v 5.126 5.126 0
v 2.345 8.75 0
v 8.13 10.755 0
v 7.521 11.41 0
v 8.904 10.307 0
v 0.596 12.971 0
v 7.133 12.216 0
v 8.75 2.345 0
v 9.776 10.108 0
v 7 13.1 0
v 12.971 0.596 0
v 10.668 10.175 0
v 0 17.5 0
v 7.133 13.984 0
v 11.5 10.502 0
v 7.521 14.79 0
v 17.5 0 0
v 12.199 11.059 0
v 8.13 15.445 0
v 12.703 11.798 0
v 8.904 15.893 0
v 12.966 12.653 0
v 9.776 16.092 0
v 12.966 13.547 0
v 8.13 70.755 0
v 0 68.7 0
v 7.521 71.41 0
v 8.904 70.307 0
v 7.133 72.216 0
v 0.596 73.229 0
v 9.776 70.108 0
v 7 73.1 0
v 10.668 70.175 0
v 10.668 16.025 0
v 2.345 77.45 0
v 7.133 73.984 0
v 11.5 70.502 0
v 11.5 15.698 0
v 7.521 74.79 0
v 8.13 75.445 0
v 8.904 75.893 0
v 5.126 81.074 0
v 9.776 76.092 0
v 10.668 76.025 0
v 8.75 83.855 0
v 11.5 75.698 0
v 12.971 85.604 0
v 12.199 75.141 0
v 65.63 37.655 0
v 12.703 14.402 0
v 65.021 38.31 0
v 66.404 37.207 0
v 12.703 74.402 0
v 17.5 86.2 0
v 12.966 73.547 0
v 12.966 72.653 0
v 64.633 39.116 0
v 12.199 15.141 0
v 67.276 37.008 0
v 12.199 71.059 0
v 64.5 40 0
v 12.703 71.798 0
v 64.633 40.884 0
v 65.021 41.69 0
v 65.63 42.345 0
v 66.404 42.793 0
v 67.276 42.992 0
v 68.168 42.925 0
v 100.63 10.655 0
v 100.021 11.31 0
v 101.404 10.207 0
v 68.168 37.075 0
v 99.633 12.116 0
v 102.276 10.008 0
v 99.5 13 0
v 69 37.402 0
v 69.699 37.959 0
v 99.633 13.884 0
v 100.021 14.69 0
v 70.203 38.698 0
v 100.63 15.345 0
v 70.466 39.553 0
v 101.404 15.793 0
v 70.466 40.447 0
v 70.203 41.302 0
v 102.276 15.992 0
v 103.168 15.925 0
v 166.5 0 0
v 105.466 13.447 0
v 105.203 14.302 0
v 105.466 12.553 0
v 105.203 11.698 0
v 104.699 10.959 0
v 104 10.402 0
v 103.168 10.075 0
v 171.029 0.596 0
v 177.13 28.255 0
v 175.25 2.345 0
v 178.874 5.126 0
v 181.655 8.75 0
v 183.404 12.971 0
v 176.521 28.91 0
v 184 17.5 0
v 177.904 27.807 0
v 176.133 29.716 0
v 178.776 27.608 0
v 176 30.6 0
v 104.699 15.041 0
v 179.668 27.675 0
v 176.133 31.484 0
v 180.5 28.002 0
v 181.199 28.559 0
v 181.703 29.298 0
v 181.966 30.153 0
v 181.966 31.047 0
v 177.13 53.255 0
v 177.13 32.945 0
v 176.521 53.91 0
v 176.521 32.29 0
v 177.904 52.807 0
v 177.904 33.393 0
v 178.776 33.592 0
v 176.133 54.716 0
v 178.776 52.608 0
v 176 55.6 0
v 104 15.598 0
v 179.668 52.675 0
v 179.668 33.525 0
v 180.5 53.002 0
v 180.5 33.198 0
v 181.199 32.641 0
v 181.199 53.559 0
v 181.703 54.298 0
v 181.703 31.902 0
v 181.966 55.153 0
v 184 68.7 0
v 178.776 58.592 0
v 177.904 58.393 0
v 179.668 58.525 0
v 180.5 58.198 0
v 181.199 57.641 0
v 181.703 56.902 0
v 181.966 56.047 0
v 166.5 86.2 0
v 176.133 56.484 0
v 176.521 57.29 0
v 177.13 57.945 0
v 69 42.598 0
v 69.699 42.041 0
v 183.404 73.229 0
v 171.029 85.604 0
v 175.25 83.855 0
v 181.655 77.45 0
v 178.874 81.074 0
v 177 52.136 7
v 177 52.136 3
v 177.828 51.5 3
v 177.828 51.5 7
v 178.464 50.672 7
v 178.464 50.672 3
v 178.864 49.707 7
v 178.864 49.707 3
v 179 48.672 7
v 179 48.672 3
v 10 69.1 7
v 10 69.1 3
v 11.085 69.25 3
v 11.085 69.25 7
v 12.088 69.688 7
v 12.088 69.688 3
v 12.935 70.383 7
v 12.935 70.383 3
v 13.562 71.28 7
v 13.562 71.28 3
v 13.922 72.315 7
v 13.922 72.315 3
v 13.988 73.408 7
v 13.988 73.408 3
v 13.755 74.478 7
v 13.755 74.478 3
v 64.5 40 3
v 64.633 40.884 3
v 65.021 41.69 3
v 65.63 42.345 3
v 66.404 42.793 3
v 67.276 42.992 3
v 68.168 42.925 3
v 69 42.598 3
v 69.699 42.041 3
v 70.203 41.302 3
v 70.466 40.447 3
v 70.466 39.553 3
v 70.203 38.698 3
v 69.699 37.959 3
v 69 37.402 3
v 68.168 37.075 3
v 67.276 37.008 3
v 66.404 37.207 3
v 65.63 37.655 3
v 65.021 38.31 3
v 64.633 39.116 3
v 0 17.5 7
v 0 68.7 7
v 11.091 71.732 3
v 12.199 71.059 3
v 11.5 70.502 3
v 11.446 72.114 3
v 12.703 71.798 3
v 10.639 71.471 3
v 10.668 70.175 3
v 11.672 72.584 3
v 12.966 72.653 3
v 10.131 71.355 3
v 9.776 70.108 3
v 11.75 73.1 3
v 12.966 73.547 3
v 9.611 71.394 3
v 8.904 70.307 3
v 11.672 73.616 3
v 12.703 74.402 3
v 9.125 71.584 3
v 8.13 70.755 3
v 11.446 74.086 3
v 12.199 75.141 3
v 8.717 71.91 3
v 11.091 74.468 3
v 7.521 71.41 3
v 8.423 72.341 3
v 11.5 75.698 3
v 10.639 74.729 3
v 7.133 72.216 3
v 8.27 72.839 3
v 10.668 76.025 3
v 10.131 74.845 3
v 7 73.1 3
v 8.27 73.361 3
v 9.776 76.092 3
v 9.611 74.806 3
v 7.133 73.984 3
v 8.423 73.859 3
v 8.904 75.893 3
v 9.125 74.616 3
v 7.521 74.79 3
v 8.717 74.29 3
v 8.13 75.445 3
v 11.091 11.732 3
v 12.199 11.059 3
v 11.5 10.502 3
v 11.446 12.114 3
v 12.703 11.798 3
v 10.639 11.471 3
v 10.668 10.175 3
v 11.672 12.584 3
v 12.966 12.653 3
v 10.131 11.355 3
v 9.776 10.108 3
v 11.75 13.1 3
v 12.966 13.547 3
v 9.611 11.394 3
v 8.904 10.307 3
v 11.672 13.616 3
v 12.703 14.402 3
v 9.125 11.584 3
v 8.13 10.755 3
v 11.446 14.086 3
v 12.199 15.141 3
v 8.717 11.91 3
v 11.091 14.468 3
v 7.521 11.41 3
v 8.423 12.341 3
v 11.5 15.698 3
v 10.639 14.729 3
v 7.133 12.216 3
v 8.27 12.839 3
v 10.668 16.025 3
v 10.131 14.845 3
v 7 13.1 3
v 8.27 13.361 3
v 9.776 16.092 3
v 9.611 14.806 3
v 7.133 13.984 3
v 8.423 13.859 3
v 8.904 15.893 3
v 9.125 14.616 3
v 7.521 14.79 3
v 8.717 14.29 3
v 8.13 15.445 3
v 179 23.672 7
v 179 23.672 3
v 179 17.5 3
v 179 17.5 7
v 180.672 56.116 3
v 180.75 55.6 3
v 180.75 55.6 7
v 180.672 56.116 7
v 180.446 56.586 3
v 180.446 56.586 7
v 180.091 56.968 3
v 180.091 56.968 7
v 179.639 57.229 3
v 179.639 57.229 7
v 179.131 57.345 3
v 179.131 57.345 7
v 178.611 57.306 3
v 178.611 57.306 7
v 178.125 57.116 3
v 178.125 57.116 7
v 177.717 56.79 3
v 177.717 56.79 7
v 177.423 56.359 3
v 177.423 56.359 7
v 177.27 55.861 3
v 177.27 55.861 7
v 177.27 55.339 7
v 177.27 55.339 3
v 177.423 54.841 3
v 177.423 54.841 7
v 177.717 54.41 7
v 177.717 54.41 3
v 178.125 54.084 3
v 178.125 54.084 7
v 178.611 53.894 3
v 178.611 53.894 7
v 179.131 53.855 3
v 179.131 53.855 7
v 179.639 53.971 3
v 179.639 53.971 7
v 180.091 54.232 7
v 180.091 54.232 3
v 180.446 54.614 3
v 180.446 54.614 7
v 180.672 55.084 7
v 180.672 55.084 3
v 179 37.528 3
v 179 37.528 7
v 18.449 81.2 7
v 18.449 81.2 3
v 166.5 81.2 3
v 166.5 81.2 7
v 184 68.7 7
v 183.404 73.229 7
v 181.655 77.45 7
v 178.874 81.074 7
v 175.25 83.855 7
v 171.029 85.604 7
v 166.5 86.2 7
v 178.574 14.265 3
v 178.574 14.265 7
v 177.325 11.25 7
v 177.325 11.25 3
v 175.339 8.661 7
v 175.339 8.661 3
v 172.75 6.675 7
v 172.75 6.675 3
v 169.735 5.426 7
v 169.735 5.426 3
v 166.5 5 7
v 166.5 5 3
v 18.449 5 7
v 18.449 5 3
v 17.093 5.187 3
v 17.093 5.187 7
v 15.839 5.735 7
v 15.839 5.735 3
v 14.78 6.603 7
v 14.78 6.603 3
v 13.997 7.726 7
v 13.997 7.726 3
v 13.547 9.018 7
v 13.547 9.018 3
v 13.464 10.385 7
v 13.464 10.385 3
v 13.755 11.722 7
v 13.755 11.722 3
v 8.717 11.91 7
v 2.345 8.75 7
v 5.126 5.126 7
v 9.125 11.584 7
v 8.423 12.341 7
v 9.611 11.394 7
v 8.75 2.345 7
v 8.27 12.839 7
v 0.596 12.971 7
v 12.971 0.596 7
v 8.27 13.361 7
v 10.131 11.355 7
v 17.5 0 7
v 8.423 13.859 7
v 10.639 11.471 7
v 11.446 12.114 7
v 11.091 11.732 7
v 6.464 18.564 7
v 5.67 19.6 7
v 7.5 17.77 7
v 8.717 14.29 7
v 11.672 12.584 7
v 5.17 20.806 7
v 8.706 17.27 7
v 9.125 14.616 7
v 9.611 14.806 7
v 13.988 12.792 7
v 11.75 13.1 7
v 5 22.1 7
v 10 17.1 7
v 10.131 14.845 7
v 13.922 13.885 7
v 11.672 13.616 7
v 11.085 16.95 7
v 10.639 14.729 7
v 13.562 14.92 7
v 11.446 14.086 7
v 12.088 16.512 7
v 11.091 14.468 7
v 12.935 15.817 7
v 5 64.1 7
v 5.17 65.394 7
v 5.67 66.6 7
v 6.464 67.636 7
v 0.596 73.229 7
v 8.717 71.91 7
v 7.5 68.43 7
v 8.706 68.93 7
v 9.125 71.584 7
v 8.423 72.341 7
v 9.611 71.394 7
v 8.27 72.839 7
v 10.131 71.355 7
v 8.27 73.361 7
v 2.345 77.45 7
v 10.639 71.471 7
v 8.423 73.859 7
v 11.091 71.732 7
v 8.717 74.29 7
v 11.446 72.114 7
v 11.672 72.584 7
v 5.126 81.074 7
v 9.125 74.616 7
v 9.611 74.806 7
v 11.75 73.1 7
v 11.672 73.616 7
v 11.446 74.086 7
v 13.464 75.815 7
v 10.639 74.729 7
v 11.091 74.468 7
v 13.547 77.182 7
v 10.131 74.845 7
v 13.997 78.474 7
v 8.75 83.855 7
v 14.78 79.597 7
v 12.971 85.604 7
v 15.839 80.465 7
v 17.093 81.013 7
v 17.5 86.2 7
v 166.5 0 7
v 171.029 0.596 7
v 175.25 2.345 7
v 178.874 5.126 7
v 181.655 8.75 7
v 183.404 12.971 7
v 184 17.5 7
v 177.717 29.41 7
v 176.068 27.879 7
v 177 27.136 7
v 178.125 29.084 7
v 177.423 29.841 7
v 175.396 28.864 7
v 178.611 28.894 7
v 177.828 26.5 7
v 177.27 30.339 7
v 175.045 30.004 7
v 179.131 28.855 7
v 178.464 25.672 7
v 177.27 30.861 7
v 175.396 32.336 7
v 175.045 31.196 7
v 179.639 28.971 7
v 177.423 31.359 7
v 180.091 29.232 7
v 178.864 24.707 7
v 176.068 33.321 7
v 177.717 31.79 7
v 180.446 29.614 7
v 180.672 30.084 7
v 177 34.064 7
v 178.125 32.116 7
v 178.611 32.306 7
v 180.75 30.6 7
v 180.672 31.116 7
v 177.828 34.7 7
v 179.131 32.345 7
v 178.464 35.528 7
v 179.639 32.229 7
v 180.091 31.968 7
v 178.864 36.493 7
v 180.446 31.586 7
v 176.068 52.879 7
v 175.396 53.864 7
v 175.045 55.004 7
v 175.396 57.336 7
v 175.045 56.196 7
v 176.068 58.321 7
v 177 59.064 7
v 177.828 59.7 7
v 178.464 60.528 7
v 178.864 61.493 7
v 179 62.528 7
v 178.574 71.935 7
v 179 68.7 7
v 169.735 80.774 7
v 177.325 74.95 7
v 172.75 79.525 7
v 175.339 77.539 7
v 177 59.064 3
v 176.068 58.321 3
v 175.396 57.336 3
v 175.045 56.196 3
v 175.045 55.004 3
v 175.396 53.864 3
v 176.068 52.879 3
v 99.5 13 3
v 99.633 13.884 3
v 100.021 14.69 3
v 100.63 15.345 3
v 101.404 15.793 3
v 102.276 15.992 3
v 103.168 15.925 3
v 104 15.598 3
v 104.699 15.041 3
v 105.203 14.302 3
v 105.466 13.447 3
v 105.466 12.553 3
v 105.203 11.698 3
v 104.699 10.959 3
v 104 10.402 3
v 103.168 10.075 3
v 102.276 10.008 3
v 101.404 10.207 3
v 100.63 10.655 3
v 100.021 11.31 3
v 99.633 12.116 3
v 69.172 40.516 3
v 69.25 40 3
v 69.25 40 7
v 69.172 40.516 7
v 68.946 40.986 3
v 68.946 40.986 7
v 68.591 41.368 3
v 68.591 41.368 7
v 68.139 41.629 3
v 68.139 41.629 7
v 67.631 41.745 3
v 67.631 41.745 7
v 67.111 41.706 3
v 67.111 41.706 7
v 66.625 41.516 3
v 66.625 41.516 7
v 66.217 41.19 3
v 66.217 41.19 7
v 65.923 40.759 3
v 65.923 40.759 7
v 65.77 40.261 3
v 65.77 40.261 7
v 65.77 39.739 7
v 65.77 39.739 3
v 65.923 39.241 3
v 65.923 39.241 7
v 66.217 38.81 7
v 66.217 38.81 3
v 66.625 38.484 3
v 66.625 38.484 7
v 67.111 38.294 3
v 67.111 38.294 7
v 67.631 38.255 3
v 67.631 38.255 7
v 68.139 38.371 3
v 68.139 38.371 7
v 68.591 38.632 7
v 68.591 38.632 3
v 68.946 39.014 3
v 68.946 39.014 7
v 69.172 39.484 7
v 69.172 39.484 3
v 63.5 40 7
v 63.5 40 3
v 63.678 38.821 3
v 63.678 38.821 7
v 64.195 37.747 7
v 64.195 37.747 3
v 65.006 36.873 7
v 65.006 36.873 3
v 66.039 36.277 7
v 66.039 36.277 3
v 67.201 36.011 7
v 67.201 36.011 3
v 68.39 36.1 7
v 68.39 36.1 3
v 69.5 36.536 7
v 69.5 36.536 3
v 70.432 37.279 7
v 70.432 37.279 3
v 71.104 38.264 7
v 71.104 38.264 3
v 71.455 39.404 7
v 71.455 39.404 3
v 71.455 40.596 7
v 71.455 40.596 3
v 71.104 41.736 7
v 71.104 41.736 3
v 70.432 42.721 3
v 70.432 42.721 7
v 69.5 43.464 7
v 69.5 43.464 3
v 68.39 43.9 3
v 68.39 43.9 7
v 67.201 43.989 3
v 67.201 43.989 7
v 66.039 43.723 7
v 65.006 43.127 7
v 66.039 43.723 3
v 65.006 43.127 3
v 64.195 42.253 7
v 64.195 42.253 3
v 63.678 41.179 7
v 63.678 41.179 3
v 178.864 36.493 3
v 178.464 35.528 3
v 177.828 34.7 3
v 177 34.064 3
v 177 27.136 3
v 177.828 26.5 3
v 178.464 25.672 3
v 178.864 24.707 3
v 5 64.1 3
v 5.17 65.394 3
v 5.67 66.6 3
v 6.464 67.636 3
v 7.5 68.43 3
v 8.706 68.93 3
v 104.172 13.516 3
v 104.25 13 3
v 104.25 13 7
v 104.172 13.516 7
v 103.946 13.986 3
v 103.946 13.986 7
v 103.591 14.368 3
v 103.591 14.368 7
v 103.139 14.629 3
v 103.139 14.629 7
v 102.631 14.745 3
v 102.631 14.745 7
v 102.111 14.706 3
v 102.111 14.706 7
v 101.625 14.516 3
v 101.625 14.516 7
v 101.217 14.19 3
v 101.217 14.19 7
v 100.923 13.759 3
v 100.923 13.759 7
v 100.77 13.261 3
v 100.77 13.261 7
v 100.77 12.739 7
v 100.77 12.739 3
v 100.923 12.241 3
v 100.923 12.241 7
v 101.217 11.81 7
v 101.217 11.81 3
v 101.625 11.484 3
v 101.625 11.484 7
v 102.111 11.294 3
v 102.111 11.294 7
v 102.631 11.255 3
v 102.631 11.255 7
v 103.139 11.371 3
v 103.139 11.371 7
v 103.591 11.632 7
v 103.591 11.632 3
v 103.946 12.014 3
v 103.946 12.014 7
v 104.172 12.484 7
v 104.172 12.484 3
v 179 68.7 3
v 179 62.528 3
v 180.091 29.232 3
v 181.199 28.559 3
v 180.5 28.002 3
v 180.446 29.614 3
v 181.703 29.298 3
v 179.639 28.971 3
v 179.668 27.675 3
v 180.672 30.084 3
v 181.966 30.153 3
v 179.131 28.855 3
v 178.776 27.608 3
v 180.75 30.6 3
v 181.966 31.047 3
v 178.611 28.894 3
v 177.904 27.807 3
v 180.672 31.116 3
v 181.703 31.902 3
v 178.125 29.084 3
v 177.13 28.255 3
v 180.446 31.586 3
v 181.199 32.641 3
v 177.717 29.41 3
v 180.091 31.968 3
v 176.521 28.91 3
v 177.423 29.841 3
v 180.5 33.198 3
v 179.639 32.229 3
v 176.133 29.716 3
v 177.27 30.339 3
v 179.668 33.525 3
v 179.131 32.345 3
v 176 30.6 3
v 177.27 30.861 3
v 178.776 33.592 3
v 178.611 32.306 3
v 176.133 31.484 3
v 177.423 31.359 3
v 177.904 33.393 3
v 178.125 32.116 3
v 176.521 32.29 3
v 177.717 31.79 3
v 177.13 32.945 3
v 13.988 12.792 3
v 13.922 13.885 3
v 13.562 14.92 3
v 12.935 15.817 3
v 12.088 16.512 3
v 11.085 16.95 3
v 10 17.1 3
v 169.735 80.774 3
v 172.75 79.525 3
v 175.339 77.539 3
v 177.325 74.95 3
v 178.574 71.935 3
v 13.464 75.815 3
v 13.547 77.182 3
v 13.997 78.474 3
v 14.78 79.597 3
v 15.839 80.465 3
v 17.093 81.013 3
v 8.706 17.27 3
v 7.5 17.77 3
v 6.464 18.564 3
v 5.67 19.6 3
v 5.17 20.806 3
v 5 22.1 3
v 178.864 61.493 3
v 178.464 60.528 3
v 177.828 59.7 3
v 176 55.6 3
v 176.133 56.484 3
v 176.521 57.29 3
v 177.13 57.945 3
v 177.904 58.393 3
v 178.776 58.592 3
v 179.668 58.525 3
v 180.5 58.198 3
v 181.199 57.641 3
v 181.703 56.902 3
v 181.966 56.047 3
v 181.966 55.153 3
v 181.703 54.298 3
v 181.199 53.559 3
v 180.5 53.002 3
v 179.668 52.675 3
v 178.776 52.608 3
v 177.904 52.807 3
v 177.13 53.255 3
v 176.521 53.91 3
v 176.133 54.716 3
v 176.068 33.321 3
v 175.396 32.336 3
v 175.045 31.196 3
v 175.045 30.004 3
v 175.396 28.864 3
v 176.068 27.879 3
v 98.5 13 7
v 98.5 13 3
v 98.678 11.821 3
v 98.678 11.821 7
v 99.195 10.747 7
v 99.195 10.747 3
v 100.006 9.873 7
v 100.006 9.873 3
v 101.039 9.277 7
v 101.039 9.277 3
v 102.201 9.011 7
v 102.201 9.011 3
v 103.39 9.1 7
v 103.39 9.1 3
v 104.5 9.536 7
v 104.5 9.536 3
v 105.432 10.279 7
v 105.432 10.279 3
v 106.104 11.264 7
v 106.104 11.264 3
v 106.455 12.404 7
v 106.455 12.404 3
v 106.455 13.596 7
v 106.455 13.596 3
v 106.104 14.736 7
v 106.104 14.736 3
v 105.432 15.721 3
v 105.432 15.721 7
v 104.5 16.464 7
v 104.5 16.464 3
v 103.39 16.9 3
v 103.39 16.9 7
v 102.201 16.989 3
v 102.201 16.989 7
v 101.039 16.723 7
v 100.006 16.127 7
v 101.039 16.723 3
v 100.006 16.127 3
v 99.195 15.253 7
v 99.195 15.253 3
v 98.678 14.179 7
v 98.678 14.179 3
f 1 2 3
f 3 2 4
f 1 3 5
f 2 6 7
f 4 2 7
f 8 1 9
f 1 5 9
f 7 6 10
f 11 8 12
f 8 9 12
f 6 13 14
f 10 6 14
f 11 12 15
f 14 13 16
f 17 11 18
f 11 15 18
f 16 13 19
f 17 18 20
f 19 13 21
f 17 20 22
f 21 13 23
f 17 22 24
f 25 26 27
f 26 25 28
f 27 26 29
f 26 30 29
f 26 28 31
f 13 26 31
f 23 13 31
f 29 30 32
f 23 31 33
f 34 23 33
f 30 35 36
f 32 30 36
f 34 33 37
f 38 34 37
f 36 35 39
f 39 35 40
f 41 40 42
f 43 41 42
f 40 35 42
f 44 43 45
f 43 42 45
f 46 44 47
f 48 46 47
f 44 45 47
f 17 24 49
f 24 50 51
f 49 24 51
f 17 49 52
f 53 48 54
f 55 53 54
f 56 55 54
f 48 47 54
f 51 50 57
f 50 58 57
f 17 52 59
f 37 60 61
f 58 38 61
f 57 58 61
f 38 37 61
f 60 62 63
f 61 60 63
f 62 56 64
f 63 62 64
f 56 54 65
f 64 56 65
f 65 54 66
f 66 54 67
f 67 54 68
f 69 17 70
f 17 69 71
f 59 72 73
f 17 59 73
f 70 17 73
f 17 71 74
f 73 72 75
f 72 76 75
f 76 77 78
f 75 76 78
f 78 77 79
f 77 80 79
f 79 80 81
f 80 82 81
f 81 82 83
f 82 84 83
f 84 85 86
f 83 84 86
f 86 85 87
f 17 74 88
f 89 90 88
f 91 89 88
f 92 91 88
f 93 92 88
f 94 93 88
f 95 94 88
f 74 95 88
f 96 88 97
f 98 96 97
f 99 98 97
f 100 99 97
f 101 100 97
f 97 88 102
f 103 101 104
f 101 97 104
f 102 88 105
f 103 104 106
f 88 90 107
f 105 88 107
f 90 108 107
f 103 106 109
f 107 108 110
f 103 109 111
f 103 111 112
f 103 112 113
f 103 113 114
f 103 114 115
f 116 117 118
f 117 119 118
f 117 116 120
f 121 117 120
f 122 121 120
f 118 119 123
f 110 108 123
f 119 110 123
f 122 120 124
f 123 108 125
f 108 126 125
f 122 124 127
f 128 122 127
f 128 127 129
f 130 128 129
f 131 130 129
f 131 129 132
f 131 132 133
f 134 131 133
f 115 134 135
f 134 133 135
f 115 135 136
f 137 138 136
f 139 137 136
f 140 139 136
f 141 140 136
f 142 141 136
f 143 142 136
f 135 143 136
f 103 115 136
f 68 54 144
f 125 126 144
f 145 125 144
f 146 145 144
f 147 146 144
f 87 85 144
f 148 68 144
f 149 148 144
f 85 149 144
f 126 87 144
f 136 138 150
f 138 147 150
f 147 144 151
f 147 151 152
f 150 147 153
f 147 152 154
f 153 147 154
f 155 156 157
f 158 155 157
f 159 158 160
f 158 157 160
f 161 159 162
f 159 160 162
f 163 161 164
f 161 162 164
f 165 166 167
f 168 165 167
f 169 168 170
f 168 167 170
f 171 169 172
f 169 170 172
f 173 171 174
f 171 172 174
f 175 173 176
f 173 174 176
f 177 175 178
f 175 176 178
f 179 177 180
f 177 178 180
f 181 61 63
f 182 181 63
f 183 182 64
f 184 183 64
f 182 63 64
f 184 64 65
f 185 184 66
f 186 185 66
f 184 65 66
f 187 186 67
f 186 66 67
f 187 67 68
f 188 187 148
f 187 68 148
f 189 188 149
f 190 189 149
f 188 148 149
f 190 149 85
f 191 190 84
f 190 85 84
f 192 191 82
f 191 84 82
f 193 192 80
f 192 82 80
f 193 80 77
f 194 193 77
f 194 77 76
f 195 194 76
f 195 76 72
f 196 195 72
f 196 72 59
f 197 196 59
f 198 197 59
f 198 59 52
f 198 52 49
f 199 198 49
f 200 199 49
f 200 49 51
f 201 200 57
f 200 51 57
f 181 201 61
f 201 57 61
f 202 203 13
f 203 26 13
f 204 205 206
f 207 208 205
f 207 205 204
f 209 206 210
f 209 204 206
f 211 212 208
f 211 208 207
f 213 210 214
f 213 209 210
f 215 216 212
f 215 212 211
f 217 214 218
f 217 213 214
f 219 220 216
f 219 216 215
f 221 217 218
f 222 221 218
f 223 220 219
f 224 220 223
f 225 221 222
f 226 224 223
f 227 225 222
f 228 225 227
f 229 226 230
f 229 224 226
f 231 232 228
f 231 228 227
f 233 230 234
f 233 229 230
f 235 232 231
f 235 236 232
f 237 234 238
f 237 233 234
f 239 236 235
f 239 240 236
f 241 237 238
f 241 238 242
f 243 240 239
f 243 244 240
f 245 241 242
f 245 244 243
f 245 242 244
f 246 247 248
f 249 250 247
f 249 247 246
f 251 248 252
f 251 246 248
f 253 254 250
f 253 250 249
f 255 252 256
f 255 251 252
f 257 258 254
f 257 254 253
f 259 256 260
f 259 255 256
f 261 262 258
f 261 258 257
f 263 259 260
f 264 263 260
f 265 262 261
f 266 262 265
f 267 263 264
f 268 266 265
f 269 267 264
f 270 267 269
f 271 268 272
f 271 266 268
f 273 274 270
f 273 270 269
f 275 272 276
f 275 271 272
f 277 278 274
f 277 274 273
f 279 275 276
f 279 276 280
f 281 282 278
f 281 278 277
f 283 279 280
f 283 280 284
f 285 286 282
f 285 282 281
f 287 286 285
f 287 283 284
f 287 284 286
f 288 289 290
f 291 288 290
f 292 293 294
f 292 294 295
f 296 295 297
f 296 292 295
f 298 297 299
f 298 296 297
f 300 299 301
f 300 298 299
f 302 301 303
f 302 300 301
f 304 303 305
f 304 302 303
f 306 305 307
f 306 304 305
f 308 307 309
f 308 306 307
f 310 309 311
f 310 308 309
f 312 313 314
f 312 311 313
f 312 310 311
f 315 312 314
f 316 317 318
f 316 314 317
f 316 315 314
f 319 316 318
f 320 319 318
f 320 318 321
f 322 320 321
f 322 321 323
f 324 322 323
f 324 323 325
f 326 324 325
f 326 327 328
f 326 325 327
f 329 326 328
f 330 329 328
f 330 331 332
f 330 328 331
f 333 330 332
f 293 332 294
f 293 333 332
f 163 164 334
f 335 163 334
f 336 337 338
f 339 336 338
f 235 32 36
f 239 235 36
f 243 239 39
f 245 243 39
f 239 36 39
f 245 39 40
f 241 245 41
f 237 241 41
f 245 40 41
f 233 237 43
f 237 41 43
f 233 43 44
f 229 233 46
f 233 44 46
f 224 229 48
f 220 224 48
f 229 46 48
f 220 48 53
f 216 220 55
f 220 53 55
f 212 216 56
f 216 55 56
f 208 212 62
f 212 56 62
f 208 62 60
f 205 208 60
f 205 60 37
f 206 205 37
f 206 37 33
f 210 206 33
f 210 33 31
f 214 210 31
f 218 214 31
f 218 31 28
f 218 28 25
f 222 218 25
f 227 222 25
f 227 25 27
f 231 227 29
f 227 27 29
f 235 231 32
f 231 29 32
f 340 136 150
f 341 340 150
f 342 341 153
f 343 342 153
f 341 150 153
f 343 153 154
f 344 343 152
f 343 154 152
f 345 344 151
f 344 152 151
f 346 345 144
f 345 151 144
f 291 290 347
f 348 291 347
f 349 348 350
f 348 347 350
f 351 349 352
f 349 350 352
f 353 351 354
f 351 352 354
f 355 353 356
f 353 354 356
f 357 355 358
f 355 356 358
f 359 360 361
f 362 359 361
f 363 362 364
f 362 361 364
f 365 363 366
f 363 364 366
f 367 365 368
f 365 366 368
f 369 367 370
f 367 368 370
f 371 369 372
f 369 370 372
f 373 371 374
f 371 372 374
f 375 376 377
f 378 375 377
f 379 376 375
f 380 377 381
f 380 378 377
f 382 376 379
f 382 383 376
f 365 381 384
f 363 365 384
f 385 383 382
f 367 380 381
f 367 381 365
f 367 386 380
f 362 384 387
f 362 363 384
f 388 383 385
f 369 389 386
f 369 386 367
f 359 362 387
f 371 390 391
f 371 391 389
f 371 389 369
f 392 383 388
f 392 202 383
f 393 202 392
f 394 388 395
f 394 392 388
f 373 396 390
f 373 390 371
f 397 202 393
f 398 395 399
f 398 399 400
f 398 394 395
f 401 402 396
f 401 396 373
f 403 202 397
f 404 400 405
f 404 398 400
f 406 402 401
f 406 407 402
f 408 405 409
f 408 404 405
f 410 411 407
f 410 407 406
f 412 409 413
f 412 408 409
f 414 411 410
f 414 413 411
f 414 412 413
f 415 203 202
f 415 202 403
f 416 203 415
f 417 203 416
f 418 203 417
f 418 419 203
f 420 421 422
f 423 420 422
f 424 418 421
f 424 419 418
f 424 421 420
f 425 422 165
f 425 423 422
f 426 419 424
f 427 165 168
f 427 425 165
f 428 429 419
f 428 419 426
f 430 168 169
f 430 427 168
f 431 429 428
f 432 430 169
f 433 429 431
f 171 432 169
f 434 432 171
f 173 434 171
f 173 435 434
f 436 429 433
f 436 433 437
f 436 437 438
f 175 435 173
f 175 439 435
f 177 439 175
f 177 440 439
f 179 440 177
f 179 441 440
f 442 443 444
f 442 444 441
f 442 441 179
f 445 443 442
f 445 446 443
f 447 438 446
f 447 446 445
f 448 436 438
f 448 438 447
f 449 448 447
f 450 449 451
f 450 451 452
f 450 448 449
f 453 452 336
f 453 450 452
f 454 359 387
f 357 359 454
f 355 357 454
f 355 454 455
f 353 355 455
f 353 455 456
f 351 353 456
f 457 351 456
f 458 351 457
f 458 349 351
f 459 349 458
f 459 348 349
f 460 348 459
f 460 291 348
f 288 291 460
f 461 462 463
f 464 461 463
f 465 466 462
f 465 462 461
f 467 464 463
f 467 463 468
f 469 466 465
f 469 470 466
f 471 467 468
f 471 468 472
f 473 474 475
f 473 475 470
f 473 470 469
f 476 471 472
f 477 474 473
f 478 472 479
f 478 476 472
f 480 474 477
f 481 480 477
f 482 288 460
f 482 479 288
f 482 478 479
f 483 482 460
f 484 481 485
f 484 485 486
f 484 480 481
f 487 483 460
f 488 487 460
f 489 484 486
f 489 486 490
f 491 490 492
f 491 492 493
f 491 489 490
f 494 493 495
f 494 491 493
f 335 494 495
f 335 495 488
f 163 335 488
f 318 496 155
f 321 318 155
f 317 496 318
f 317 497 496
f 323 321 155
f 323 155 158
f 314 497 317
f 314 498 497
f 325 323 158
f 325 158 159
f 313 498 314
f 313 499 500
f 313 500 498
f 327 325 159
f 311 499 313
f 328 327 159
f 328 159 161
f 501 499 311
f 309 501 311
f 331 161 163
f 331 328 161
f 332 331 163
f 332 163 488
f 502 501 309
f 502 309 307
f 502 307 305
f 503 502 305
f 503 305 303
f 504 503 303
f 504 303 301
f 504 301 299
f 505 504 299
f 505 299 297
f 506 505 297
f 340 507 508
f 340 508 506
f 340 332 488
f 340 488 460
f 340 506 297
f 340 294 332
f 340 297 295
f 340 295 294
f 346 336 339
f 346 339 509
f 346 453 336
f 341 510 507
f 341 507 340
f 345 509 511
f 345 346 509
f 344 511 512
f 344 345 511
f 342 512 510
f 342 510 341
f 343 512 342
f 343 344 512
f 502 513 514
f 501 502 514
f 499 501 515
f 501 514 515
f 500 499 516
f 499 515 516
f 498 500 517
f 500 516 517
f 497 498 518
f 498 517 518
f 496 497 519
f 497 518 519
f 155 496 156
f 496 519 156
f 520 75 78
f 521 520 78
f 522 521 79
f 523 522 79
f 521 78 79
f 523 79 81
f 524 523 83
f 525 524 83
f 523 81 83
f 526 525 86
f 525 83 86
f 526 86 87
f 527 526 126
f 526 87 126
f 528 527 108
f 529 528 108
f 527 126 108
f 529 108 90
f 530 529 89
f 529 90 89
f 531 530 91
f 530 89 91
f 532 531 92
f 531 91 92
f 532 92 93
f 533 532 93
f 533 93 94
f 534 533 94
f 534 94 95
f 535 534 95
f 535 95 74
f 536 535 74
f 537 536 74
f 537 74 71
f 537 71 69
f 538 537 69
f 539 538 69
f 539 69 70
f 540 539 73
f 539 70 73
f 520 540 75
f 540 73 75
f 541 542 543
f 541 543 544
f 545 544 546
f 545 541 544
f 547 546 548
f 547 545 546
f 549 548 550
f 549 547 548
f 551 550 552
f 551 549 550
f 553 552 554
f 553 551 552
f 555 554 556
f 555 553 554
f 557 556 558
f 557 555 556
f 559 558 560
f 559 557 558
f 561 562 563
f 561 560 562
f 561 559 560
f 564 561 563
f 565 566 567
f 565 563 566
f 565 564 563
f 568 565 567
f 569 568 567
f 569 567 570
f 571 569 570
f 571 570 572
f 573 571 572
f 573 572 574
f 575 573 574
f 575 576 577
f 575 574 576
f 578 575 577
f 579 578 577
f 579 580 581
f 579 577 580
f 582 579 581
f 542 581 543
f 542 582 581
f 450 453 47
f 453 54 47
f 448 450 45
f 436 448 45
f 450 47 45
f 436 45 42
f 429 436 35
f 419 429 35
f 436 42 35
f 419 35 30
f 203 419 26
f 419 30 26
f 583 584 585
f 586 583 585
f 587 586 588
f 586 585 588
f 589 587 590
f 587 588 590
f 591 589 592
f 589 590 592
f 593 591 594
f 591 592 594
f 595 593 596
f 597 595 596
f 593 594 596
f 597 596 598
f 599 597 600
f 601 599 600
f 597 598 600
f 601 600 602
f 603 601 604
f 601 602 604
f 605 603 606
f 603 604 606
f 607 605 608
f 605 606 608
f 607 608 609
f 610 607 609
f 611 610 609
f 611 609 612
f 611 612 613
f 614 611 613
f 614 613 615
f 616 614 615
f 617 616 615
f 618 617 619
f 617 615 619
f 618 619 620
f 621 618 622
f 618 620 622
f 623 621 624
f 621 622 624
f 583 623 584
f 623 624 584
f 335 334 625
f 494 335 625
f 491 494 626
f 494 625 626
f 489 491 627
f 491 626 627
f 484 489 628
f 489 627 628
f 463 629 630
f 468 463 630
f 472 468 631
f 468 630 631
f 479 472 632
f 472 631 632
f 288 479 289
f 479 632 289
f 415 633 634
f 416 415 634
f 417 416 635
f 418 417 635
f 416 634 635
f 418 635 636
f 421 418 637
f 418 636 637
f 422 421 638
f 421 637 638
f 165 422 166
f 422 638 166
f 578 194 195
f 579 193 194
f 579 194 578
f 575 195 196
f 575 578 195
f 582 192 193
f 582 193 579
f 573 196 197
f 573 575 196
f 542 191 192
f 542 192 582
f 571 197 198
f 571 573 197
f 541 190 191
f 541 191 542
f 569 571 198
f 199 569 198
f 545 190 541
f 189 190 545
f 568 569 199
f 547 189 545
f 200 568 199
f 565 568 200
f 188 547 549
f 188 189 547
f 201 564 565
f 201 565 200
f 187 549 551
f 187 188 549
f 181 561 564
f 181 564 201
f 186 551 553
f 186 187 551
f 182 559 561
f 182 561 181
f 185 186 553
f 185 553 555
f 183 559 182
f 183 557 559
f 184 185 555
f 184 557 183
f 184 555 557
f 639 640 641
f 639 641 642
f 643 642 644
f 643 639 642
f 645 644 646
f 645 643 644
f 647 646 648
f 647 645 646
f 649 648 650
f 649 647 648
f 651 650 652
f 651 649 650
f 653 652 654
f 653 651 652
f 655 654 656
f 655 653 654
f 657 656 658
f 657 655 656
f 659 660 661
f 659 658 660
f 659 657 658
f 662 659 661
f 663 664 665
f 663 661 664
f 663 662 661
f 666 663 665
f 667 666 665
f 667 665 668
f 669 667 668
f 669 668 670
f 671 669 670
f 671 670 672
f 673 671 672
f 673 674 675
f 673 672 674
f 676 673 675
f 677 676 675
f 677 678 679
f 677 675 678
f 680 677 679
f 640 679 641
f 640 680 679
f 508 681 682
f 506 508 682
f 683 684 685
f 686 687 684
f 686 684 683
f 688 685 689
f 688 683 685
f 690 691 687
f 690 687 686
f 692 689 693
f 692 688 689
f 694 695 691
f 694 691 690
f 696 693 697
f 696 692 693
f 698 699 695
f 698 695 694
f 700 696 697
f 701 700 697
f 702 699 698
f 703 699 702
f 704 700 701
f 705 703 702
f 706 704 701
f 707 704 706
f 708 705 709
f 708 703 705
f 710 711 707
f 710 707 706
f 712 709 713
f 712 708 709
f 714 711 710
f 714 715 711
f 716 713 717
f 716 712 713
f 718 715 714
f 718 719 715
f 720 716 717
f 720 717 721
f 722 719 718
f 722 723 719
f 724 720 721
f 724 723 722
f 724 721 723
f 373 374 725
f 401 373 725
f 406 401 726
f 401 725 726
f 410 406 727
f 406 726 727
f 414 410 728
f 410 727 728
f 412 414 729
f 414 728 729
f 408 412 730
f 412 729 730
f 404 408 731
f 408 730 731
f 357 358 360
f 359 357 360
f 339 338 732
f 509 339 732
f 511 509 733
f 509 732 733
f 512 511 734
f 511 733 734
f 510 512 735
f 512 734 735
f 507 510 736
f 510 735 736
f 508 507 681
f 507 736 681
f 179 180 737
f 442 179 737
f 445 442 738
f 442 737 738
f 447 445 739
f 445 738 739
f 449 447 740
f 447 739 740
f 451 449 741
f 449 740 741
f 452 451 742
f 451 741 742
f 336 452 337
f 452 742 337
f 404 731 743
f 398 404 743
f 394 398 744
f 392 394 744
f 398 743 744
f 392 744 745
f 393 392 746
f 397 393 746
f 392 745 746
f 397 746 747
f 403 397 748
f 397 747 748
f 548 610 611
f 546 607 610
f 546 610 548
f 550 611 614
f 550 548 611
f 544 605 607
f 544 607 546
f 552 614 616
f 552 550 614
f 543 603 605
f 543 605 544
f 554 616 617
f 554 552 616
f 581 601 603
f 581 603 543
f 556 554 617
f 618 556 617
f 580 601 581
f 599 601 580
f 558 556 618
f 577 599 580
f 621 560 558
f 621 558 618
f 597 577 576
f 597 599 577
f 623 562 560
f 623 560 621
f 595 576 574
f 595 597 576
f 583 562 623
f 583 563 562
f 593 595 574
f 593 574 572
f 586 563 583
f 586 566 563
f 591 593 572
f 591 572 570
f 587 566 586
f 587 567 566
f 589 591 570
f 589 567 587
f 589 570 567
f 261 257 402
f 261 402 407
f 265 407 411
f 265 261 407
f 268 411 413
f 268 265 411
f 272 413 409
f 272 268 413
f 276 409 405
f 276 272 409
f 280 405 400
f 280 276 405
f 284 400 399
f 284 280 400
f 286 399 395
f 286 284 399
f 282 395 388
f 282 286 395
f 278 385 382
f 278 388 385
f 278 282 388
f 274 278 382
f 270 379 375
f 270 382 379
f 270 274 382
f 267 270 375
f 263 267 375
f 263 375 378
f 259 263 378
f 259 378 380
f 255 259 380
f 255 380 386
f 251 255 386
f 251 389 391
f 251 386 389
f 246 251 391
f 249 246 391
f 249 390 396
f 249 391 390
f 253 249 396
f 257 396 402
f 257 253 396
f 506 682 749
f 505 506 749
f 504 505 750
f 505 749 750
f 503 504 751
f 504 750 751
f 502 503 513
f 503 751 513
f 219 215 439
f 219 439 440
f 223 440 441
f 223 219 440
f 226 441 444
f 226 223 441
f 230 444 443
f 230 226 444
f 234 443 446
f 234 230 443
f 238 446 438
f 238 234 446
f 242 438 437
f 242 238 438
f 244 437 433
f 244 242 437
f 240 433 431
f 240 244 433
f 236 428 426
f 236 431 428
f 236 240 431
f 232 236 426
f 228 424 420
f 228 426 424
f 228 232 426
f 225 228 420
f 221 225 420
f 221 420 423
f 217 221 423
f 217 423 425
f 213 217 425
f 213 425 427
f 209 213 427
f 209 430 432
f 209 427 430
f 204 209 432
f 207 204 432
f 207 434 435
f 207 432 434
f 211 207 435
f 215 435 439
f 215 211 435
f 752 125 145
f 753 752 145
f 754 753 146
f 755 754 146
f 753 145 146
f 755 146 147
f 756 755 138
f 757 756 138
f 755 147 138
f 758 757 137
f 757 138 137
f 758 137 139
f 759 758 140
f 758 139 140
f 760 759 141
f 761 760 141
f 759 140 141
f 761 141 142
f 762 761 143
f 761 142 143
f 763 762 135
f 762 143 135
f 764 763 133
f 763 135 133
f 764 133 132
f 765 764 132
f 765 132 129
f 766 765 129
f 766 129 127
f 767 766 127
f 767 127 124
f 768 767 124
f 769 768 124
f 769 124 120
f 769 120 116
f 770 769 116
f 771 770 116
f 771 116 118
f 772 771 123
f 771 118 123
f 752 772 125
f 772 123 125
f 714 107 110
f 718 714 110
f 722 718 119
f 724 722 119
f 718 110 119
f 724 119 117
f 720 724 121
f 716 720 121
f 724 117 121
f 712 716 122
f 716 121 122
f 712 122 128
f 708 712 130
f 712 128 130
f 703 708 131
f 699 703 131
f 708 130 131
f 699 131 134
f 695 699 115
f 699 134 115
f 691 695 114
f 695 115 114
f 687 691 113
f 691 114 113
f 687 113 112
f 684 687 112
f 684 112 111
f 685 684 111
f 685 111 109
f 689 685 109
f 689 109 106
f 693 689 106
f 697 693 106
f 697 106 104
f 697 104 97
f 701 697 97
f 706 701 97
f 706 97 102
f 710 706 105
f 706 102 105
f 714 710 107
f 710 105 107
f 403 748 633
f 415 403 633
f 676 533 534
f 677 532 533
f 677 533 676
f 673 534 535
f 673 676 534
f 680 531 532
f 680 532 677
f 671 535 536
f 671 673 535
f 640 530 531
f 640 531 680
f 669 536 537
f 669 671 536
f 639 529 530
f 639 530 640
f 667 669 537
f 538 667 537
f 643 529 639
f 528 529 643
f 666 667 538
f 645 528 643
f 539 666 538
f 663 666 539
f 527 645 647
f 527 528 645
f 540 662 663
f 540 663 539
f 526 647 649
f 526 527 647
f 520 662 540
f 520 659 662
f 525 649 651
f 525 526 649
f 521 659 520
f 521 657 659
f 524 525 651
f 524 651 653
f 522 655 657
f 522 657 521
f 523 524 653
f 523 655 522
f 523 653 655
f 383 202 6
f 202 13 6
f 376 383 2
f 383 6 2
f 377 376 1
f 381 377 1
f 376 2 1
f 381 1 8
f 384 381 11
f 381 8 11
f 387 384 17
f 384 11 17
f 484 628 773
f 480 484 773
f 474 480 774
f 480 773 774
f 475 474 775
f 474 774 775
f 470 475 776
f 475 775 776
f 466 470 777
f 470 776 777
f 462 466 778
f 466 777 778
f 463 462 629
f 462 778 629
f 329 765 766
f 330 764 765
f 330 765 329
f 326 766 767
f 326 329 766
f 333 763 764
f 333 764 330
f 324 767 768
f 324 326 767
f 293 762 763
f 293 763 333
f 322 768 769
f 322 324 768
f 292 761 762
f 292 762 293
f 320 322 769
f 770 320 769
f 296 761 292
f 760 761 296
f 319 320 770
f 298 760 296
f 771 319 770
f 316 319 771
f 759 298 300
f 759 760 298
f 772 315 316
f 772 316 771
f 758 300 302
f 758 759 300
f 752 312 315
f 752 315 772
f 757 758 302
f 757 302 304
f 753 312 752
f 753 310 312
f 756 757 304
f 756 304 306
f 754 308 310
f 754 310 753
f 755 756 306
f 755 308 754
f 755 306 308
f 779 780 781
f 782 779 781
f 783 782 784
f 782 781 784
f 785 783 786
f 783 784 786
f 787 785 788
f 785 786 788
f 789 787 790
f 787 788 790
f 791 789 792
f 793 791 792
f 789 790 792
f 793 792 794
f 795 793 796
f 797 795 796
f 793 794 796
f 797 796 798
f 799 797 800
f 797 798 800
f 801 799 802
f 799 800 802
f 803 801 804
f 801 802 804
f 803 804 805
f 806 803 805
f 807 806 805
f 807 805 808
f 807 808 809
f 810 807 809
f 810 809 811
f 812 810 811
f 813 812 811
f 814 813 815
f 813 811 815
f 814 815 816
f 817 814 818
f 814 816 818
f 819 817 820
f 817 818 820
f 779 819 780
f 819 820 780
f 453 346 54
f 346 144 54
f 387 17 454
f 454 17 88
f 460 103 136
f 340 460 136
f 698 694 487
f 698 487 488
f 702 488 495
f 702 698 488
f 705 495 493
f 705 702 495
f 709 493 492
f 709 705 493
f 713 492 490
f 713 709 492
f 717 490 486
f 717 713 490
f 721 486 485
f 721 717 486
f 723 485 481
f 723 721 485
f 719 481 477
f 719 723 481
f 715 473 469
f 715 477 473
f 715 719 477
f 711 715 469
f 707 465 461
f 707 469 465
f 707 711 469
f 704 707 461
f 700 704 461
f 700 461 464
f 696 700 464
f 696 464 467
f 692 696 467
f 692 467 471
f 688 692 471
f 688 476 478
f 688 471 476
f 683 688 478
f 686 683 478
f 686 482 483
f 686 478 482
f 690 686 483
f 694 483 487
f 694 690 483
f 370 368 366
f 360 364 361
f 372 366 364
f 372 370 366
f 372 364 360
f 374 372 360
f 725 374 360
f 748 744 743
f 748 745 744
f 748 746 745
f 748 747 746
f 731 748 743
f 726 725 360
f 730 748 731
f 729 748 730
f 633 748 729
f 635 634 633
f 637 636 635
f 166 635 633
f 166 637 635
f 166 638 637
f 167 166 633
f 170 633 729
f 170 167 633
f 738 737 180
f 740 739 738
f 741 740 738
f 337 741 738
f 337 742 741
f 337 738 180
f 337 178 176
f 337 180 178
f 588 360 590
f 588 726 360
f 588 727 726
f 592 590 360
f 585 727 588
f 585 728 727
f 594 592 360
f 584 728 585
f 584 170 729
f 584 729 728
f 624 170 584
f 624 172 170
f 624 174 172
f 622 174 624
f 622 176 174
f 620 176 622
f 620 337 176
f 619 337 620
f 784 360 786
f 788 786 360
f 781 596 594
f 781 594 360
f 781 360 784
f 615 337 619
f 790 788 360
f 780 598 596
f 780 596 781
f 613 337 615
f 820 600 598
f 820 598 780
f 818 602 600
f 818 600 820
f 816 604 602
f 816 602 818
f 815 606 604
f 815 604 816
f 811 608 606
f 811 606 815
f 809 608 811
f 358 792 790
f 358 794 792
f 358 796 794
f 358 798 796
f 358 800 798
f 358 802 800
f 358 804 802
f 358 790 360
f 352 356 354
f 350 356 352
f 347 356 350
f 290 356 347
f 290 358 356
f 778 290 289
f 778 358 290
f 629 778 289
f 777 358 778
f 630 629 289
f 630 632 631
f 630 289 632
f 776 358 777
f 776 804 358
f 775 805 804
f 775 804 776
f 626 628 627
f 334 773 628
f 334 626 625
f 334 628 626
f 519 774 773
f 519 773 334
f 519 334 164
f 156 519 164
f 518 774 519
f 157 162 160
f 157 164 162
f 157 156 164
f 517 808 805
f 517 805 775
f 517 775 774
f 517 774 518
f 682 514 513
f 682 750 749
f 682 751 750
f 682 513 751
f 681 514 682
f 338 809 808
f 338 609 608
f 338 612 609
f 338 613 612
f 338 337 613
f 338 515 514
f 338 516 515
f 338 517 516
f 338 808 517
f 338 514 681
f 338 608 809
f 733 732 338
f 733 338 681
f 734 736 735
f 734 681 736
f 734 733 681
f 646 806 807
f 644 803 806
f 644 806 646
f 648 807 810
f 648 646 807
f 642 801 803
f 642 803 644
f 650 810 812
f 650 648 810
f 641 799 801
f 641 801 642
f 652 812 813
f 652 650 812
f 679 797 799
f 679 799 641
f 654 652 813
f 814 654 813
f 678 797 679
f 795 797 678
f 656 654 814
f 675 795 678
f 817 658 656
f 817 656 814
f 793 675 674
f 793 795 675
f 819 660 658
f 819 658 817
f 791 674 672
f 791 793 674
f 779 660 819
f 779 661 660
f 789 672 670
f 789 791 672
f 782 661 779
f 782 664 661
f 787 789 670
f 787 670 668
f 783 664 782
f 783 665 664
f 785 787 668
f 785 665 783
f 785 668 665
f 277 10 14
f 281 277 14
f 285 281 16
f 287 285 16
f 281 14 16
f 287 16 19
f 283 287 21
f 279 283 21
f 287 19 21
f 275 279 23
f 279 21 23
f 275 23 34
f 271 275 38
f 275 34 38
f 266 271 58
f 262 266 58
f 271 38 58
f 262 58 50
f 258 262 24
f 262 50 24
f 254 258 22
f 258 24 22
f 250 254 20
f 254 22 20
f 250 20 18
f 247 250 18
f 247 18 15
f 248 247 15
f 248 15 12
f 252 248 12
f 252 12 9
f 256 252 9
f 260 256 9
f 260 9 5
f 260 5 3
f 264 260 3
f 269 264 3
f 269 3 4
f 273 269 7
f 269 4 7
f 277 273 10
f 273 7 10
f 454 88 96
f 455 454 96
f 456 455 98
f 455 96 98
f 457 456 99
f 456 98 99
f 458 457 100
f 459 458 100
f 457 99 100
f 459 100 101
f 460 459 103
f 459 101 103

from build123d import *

# Parameters (mm, degrees)
SALIENTE_EXTRUIR1_DEPTH    = 3
CROQUIS2_R                 = 4
SALIENTE_EXTRUIR3_DEPTH    = 4
CORTAR_EXTRUIR1_DEPTH      = 204.311190051
CORTAR_EXTRUIR1_DEPTH_BACK = 204.311190051
CROQUIS3_R                 = 1.75
CROQUIS4_R                 = 3
CORTAR_EXTRUIR2_DEPTH      = 3


with BuildPart() as part:
    # Croquis1 → Saliente-Extruir1 (new body)
    with BuildSketch(Plane.XY):
        with BuildLine():
            Line((17.5, 0), (166.5, 0))
            ThreePointArc((166.5, 0), (178.874368671, 5.125631329), (184, 17.5))
            Line((184, 17.5), (184, 68.7))
            ThreePointArc((184, 68.7), (178.874368671, 81.074368671), (166.5, 86.2))
            Line((166.5, 86.2), (17.5, 86.2))
            ThreePointArc((17.5, 86.2), (5.125631329, 81.074368671), (0, 68.7))
            Line((0, 68.7), (0, 17.5))
            ThreePointArc((0, 17.5), (5.125631329, 5.125631329), (17.5, 0))
        make_face()
    extrude(amount=SALIENTE_EXTRUIR1_DEPTH)

    # Croquis2 → Saliente-Extruir3 (add)
    # profile 1 of 3: a face of its own
    with BuildSketch(Plane.XY.offset(3)):
        with BuildLine():
            ThreePointArc((184, 68.7), (178.874368671, 81.074368671), (166.5, 86.2))
            Line((166.5, 86.2), (17.5, 86.2))
            ThreePointArc((17.5, 86.2), (5.125631329, 81.074368671), (0, 68.7))
            Line((0, 68.7), (0, 17.5))
            ThreePointArc((0, 17.5), (5.125631329, 5.125631329), (17.5, 0))
            Line((17.5, 0), (166.5, 0))
            ThreePointArc((166.5, 0), (178.874368671, 5.125631329), (184, 17.5))
            Line((184, 17.5), (184, 68.7))
        make_face()
        with BuildLine():
            Line((166.5, 5), (18.449260323, 5))
            ThreePointArc((18.449260323, 5), (14.349802364, 7.137405994), (13.75522681, 11.722222222))
            ThreePointArc((13.75522681, 11.722222222), (13.279566367, 15.390075205), (10, 17.1))
            ThreePointArc((10, 17.1), (6.464466094, 18.564466094), (5, 22.1))
            Line((5, 22.1), (5, 64.1))
            ThreePointArc((5, 64.1), (6.464466094, 67.635533906), (10, 69.1))
            ThreePointArc((10, 69.1), (13.279566367, 70.809924795), (13.75522681, 74.477777778))
            ThreePointArc((13.75522681, 74.477777778), (14.349802364, 79.062594006), (18.449260323, 81.2))
            Line((18.449260323, 81.2), (166.5, 81.2))
            ThreePointArc((166.5, 81.2), (175.338834765, 77.538834765), (179, 68.7))
            Line((179, 68.7), (179, 62.52820323))
            ThreePointArc((179, 62.52820323), (178.464101615, 60.52820323), (177, 59.064101615))
            ThreePointArc((177, 59.064101615), (175, 55.6), (177, 52.135898385))
            ThreePointArc((177, 52.135898385), (178.464101615, 50.67179677), (179, 48.67179677))
            Line((179, 48.67179677), (179, 37.52820323))
            ThreePointArc((179, 37.52820323), (178.464101615, 35.52820323), (177, 34.064101615))
            ThreePointArc((177, 34.064101615), (175, 30.6), (177, 27.135898385))
            ThreePointArc((177, 27.135898385), (178.464101615, 25.67179677), (179, 23.67179677))
            Line((179, 23.67179677), (179, 17.5))
            ThreePointArc((179, 17.5), (175.338834765, 8.661165235), (166.5, 5))
        make_face(mode=Mode.SUBTRACT)
    # profile 2 of 3: a face of its own
    with BuildSketch(Plane.XY.offset(3)):
        with Locations(Location((102.5, 13, 0), (0, 0, 180))):
            Circle(CROQUIS2_R)
    # profile 3 of 3: a face of its own
    with BuildSketch(Plane.XY.offset(3)):
        with Locations(Location((67.5, 40, 0), (0, 0, 180))):
            Circle(CROQUIS2_R)
    extrude(amount=SALIENTE_EXTRUIR3_DEPTH)

    # Croquis3 → Cortar-Extruir1 (cut, two sides: drawn at the far end of the back side and taken through both)
    with BuildSketch(Plane.XY.offset(7).offset(-CORTAR_EXTRUIR1_DEPTH_BACK)):
        with Locations((10, 13.1)):
            Circle(CROQUIS3_R)
        with Locations((67.5, 40)):
            Circle(CROQUIS3_R)
        with Locations((102.5, 13)):
            Circle(CROQUIS3_R)
        with Locations((10, 73.1)):
            Circle(CROQUIS3_R)
        with Locations((179, 55.6)):
            Circle(CROQUIS3_R)
        with Locations((179, 30.6)):
            Circle(CROQUIS3_R)
    extrude(amount=CORTAR_EXTRUIR1_DEPTH + CORTAR_EXTRUIR1_DEPTH_BACK, mode=Mode.SUBTRACT)

    # Croquis4 → Cortar-Extruir2 (cut)
    with BuildSketch(Plane(origin=(0, 0, 0), x_dir=(-1, 0, 0), z_dir=(0, 0, -1))):
        with Locations((-179, 30.6)):
            Circle(CROQUIS4_R)
        with Locations((-179, 55.6)):
            Circle(CROQUIS4_R)
        with Locations((-102.5, 13)):
            Circle(CROQUIS4_R)
        with Locations((-67.5, 40)):
            Circle(CROQUIS4_R)
        with Locations((-10, 73.1)):
            Circle(CROQUIS4_R)
        with Locations((-10, 13.1)):
            Circle(CROQUIS4_R)
    extrude(amount=-CORTAR_EXTRUIR2_DEPTH, mode=Mode.SUBTRACT)


solid = part.part
